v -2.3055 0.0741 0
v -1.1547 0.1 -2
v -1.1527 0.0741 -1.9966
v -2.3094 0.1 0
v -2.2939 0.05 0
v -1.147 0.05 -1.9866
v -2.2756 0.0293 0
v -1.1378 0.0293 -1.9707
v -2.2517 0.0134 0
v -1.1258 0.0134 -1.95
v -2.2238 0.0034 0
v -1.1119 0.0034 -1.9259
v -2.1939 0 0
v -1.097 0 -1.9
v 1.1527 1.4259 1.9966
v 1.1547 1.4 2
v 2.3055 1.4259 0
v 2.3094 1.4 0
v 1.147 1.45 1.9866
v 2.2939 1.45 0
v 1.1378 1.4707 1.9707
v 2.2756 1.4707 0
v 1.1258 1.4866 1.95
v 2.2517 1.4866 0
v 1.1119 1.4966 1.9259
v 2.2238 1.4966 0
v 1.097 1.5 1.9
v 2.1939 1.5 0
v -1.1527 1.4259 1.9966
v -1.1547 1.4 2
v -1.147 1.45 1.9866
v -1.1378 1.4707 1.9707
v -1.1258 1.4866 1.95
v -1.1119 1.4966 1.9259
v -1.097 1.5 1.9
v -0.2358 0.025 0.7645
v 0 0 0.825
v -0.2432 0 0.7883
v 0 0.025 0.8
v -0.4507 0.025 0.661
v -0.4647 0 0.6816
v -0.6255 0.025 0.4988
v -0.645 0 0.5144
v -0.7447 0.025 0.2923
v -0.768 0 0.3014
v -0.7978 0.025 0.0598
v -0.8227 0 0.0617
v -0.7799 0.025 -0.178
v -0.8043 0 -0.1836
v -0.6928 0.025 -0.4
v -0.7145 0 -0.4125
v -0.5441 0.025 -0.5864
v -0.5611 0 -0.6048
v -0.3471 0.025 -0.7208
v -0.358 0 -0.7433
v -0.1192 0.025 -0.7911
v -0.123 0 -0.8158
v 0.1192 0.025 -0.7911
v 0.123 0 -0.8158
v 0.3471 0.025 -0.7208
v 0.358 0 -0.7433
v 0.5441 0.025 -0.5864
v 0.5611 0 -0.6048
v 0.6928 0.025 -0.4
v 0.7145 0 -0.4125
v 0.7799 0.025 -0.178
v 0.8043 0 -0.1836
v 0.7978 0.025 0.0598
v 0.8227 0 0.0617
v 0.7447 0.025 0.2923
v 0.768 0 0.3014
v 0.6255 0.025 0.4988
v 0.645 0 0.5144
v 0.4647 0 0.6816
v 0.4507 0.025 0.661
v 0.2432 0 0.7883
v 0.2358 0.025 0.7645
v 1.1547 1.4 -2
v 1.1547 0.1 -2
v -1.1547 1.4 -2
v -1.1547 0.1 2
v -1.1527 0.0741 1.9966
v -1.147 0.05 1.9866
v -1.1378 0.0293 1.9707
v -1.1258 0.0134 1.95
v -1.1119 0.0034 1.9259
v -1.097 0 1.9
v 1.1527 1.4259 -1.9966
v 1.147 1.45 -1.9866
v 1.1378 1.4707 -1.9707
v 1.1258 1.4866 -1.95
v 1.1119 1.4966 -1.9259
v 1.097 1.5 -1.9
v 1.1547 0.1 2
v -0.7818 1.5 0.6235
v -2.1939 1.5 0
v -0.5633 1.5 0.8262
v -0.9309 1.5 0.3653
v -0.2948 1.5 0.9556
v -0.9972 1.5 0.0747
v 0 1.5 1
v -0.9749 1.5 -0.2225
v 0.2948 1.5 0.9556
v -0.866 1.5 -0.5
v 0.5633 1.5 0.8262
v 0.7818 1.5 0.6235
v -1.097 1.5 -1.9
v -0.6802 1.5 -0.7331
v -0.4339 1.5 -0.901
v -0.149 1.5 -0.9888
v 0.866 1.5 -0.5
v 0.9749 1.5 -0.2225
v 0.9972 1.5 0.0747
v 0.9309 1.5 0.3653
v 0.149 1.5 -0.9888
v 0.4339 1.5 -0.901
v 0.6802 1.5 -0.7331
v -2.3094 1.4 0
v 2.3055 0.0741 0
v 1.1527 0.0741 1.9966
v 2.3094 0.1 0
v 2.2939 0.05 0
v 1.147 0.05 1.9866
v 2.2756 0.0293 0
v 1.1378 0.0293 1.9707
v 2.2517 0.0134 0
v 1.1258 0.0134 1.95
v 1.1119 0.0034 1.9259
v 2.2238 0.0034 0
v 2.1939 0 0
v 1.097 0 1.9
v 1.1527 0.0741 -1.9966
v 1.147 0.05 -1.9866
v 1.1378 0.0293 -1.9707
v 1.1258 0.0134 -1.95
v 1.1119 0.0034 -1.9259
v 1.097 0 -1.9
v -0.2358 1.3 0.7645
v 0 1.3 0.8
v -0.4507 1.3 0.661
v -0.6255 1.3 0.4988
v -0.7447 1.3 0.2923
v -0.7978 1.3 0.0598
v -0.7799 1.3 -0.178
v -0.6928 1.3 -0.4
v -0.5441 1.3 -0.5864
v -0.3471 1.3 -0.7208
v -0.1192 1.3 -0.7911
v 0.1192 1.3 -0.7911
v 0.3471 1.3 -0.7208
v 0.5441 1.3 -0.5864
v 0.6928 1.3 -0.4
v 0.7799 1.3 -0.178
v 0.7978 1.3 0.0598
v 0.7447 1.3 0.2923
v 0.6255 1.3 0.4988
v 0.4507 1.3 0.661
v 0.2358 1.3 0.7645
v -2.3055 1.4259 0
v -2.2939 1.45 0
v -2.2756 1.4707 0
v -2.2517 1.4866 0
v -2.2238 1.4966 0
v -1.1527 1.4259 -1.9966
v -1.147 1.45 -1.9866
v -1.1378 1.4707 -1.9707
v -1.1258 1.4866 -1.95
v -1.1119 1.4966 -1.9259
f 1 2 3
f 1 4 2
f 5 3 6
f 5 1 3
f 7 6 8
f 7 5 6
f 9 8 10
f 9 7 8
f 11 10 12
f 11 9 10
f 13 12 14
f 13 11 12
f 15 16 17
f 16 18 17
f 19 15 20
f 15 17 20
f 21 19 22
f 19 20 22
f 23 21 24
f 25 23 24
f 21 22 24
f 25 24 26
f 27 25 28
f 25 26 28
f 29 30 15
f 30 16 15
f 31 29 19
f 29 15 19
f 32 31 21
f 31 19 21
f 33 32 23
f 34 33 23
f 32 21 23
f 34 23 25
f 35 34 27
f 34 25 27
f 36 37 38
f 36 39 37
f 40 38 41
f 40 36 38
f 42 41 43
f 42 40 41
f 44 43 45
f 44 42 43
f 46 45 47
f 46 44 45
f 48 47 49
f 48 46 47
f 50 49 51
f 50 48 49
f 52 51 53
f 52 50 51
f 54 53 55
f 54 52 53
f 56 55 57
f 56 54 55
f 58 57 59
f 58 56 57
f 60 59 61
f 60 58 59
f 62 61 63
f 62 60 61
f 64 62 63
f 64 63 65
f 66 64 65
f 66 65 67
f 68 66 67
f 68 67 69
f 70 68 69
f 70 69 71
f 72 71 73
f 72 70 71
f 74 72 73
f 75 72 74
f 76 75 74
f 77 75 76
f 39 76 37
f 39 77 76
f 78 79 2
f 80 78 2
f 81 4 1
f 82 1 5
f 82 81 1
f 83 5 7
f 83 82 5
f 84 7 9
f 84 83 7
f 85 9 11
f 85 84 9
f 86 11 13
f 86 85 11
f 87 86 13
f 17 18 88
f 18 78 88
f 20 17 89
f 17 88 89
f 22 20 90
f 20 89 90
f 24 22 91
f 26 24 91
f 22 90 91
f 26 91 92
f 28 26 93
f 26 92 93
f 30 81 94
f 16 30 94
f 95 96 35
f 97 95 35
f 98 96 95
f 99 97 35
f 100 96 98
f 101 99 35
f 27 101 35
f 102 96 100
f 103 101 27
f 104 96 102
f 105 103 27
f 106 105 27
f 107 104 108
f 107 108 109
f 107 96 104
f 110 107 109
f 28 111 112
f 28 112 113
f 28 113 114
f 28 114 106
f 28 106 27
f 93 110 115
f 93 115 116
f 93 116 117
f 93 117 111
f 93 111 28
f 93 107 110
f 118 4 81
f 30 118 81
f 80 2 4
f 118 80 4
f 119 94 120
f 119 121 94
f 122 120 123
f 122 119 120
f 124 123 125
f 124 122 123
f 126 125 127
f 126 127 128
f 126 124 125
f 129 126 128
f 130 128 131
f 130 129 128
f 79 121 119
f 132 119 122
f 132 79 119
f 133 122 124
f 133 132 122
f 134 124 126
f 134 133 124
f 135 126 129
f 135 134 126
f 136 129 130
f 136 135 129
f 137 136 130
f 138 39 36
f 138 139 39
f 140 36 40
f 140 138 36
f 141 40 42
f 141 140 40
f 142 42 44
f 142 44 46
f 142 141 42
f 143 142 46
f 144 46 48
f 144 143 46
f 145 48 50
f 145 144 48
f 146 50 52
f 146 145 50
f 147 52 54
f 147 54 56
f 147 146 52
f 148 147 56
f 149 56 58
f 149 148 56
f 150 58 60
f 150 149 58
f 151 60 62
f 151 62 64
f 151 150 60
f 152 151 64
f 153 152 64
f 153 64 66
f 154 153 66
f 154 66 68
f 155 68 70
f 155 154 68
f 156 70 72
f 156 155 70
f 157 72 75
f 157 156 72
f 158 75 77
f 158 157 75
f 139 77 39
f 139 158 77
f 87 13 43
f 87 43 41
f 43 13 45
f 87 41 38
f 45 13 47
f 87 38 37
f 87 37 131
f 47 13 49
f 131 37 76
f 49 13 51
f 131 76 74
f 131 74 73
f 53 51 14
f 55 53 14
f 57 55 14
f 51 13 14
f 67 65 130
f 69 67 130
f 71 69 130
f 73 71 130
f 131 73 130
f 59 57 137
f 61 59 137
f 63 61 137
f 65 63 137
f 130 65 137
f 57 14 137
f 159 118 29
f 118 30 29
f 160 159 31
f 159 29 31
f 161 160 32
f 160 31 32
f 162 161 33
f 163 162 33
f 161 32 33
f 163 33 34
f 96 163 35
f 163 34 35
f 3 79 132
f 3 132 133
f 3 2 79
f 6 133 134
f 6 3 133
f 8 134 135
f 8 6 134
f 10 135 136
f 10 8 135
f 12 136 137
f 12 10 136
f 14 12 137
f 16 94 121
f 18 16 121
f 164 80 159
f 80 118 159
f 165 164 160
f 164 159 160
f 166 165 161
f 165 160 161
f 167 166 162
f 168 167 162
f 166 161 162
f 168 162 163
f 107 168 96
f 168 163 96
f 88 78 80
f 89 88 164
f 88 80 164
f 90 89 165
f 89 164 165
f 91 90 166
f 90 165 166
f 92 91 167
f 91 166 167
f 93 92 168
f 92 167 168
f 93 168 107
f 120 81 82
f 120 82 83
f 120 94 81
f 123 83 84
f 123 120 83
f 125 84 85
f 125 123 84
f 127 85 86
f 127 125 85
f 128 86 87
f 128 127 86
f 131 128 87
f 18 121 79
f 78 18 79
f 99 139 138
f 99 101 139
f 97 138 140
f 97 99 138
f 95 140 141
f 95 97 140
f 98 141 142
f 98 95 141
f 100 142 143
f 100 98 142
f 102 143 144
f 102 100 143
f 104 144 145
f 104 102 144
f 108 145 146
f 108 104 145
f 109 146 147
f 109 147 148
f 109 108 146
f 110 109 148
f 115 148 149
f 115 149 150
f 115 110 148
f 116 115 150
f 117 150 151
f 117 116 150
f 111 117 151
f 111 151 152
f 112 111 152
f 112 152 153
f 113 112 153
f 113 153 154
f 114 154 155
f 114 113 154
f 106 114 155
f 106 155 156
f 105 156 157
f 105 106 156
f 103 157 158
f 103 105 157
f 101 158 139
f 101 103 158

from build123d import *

# Parameters (mm, degrees)
BOSS_EXTRUDE1_DEPTH = 1.5
FILLET2_R           = 0.1


with BuildPart() as part:
    # Sketch1 → Boss-Extrude1 (new body)
    with BuildSketch(Plane(origin=(0, 0, 0), x_dir=(1, 0, 0), z_dir=(0, 1, 0))):
        Polygon((2.309401077, 0), (1.154700538, 2), (-1.154700538, 2), (-2.309401077, 0), (-1.154700538, -2), (1.154700538, -2), align=None)
    extrude(amount=BOSS_EXTRUDE1_DEPTH)

    # Fillet2
    fillet2_edges = [part.edges().sort_by_distance(p)[0] for p in [
        (0, 1.5, -2),
        (-1.732050808, 1.5, -1),
        (-1.732050808, 1.5, 1),
        (0, 1.5, 2),
        (1.732050808, 1.5, 1),
        (0, 0, 2),
        (-1.732050808, 0, 1),
        (-1.732050808, 0, -1),
        (0, 0, -2),
        (1.732050808, 0, -1),
        (1.732050808, 0, 1),
        (1.732050808, 1.5, -1),
    ]]
    fillet(fillet2_edges, radius=FILLET2_R)

    # Sketch3 → M2x0.4 Tapped Hole1 (revolve, cut)
    with BuildSketch(Plane(origin=(0, 1.5, 0), x_dir=(0, 0, 1), z_dir=(1, 0, 0))):
        Polygon((0, 0), (0, 1.5), (0.825, 1.5), (0.8, 1.475), (0.8, 0.2), (1, 0), align=None)
    revolve(axis=Axis((0, 7.85, 0), (0, -1, 0)), mode=Mode.SUBTRACT)


solid = part.part
